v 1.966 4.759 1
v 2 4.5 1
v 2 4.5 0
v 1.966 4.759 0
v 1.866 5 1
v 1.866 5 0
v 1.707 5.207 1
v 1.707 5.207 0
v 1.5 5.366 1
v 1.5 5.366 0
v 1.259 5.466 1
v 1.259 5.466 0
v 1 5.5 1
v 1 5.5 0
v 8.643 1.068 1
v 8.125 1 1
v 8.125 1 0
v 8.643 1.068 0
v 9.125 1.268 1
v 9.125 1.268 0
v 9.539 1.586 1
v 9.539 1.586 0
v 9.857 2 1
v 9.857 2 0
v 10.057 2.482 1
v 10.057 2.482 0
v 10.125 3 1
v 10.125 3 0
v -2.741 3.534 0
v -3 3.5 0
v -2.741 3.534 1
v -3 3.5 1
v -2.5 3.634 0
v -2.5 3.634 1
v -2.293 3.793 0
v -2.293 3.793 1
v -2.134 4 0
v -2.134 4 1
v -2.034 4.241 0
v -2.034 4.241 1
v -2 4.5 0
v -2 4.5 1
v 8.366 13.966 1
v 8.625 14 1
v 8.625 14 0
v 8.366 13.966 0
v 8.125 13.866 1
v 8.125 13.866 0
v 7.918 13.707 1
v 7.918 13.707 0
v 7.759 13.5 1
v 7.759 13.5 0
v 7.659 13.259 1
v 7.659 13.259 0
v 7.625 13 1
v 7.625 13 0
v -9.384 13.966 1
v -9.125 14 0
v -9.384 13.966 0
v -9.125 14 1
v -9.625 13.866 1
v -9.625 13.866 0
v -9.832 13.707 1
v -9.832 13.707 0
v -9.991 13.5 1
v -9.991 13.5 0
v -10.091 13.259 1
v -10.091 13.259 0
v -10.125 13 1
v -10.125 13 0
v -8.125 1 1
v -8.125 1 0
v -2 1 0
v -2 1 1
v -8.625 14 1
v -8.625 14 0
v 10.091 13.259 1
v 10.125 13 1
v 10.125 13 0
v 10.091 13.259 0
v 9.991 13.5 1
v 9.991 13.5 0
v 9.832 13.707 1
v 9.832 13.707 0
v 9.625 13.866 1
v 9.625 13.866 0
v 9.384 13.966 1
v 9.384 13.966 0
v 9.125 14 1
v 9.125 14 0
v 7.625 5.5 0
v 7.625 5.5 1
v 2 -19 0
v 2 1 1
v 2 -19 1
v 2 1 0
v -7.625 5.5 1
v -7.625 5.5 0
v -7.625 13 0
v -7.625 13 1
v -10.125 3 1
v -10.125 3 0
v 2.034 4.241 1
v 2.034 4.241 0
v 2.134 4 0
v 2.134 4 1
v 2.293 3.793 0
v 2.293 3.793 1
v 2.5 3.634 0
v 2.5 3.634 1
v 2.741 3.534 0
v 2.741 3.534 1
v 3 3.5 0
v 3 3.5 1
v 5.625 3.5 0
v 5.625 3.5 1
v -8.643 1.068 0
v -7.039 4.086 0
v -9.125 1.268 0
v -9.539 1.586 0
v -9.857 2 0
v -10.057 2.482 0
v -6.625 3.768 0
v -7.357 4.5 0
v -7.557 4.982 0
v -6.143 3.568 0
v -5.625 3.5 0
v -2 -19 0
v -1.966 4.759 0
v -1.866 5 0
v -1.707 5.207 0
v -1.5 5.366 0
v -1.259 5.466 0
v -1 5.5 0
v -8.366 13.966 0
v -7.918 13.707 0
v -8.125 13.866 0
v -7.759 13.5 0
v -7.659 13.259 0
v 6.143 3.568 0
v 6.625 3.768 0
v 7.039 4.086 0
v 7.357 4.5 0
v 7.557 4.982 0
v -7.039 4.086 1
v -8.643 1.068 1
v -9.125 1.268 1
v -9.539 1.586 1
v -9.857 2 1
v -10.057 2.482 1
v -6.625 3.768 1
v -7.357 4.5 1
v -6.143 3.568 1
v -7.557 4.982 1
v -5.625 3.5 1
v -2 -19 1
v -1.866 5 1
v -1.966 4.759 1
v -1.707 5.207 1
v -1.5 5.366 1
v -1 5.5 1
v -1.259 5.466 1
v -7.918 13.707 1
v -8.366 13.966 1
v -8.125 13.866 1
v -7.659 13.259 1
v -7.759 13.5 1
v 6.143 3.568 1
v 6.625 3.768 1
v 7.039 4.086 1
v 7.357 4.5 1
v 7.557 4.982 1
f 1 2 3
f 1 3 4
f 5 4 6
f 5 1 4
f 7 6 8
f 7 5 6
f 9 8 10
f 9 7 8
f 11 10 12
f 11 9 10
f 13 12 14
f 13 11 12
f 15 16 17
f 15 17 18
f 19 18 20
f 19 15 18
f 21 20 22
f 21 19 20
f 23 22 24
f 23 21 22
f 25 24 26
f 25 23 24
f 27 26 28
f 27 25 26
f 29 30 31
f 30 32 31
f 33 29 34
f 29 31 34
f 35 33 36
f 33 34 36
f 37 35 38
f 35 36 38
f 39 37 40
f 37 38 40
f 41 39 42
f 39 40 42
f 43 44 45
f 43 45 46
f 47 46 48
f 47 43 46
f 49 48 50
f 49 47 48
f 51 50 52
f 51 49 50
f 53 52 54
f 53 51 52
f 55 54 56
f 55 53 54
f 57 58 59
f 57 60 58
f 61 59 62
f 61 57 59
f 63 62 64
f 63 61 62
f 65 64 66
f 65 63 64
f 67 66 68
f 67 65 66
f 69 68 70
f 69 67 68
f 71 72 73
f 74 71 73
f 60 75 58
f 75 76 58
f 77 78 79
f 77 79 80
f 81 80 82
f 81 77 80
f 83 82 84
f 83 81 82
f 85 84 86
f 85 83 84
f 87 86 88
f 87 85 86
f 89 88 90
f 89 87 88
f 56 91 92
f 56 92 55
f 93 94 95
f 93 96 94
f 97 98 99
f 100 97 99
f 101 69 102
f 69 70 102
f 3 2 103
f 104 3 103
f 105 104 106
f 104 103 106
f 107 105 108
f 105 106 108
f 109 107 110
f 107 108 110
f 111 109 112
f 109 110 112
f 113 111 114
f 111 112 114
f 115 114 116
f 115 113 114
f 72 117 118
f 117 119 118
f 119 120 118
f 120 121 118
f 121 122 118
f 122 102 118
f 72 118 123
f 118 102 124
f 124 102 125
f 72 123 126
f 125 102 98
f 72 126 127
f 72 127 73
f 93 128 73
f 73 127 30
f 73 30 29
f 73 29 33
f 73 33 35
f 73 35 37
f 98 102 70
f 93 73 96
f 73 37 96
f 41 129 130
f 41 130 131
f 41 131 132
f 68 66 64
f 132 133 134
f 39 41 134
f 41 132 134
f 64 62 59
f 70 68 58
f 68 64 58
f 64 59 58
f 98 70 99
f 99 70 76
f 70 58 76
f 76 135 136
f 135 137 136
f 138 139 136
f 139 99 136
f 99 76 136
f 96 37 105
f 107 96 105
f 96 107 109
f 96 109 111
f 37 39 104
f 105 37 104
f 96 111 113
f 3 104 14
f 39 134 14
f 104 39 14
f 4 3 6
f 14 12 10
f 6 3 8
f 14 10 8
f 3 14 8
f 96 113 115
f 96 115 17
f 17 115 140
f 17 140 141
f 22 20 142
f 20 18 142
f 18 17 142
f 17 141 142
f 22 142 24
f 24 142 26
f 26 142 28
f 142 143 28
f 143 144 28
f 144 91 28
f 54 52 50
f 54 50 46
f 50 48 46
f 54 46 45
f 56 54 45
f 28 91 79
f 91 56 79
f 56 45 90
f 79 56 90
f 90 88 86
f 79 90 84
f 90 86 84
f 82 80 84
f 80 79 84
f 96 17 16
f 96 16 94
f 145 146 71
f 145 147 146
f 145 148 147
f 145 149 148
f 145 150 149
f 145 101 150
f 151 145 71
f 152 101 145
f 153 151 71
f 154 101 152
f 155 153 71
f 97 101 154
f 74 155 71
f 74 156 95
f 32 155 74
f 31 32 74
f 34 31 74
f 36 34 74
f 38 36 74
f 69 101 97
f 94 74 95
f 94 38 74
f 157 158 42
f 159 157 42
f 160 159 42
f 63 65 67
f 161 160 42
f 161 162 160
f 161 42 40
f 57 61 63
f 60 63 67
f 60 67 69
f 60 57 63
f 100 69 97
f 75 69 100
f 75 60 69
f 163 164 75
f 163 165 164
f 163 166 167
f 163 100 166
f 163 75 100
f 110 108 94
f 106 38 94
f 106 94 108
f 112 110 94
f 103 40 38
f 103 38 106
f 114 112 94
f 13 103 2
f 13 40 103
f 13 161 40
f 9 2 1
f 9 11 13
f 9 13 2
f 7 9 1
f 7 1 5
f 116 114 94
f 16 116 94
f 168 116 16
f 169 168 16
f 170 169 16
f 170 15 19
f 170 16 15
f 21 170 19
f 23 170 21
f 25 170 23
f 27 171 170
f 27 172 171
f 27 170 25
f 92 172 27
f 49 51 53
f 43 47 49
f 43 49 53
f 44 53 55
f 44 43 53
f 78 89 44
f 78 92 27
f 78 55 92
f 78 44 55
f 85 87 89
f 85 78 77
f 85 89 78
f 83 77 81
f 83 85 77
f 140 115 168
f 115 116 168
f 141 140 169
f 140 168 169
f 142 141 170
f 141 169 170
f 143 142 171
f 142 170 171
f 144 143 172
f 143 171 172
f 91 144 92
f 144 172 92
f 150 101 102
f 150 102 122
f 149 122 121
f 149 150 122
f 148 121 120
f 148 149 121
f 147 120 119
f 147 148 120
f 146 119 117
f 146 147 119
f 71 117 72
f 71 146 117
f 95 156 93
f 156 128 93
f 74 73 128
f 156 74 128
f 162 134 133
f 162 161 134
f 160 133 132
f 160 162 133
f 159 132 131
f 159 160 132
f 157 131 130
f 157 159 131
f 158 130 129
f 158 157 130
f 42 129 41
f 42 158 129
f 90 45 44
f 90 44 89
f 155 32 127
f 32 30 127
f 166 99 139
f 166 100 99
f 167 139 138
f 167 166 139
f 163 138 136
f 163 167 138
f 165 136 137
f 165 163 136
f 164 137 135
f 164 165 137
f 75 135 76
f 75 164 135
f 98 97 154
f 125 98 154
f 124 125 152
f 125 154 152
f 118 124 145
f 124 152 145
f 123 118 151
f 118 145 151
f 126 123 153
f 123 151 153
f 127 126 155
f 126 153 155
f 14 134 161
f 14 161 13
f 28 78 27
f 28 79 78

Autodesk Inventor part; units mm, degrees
ref_plane "YZ Plane" through (0, 0, 0) normal (1, 0, 0) x (0, 1, 0)
ref_plane "XZ Plane" through (0, 0, 0) normal (0, 1, 0) x (-1, 0, 0)
ref_plane "XY Plane" through (0, 0, 0) normal (0, 0, 1) x (1, 0, 0)
sketch "Sketch1" plane through (0, 0, 0) normal (0, 0, 1) x (1, 0, 0)
  line L0 (0, -25.6) -> (0, 20.6) projected
  line L1 (0, 3.5) -> (7.625, 3.5)
  line L2 (7.625, 3.5) -> (7.625, 14)
  line L3 (7.625, 14) -> (10.125, 14)
  line L4 (10.125, 14) -> (10.125, 1)
  line L5 (10.125, 1) -> (2, 1)
  line L6 (2, 1) -> (2, -19)
  line L7 (2, -19) -> (0, -19)
  line L8 (0, 3.5) -> (-7.625, 3.5)
  line L9 (-7.625, 3.5) -> (-7.625, 14)
  line L10 (-7.625, 14) -> (-10.125, 14)
  line L11 (-10.125, 14) -> (-10.125, 1)
  line L12 (-10.125, 1) -> (-2, 1)
  line L13 (-2, 1) -> (-2, -19)
  line L14 (-2, -19) -> (0, -19)
  line L15 (-2, 5.5) -> (2, 5.5)
  line L16 (2, 5.5) -> (2, 3.5)
  line L17 (2, 3.5) -> (-2, 3.5)
  line L18 (-2, 3.5) -> (-2, 5.5)
  point P0 (0, 0)
  point P1 (0, 5.5)
  dimension "d0" = 2.5
  dimension "d1" = 20.25
  dimension "d2" = 4
  dimension "d3" = 4
  dimension "d4" = 2
  dimension "d5" = 10.5
  dimension "d6" = 2.5
  dimension "d7" = 20
extrude "Extrusion1" add sketch "Sketch1" along normal blind 1
fillet "Fillet1" radius 1 4 edges at (-7.625, 14, 0.5) (-10.125, 14, 0.5) (7.625, 14, 0.5) (10.125, 14, 0.5)
fillet "Fillet2" radius 1 4 edges at (-2, 5.5, 0.5) (2, 5.5, 0.5) (2, 3.5, 0.5) (-2, 3.5, 0.5)
fillet "Fillet3" radius 2 4 edges at (-10.125, 1, 0.5) (10.125, 1, 0.5) (-7.625, 3.5, 0.5) (7.625, 3.5, 0.5)
properties part number "ASAP_Handle_Fixture_New2"
